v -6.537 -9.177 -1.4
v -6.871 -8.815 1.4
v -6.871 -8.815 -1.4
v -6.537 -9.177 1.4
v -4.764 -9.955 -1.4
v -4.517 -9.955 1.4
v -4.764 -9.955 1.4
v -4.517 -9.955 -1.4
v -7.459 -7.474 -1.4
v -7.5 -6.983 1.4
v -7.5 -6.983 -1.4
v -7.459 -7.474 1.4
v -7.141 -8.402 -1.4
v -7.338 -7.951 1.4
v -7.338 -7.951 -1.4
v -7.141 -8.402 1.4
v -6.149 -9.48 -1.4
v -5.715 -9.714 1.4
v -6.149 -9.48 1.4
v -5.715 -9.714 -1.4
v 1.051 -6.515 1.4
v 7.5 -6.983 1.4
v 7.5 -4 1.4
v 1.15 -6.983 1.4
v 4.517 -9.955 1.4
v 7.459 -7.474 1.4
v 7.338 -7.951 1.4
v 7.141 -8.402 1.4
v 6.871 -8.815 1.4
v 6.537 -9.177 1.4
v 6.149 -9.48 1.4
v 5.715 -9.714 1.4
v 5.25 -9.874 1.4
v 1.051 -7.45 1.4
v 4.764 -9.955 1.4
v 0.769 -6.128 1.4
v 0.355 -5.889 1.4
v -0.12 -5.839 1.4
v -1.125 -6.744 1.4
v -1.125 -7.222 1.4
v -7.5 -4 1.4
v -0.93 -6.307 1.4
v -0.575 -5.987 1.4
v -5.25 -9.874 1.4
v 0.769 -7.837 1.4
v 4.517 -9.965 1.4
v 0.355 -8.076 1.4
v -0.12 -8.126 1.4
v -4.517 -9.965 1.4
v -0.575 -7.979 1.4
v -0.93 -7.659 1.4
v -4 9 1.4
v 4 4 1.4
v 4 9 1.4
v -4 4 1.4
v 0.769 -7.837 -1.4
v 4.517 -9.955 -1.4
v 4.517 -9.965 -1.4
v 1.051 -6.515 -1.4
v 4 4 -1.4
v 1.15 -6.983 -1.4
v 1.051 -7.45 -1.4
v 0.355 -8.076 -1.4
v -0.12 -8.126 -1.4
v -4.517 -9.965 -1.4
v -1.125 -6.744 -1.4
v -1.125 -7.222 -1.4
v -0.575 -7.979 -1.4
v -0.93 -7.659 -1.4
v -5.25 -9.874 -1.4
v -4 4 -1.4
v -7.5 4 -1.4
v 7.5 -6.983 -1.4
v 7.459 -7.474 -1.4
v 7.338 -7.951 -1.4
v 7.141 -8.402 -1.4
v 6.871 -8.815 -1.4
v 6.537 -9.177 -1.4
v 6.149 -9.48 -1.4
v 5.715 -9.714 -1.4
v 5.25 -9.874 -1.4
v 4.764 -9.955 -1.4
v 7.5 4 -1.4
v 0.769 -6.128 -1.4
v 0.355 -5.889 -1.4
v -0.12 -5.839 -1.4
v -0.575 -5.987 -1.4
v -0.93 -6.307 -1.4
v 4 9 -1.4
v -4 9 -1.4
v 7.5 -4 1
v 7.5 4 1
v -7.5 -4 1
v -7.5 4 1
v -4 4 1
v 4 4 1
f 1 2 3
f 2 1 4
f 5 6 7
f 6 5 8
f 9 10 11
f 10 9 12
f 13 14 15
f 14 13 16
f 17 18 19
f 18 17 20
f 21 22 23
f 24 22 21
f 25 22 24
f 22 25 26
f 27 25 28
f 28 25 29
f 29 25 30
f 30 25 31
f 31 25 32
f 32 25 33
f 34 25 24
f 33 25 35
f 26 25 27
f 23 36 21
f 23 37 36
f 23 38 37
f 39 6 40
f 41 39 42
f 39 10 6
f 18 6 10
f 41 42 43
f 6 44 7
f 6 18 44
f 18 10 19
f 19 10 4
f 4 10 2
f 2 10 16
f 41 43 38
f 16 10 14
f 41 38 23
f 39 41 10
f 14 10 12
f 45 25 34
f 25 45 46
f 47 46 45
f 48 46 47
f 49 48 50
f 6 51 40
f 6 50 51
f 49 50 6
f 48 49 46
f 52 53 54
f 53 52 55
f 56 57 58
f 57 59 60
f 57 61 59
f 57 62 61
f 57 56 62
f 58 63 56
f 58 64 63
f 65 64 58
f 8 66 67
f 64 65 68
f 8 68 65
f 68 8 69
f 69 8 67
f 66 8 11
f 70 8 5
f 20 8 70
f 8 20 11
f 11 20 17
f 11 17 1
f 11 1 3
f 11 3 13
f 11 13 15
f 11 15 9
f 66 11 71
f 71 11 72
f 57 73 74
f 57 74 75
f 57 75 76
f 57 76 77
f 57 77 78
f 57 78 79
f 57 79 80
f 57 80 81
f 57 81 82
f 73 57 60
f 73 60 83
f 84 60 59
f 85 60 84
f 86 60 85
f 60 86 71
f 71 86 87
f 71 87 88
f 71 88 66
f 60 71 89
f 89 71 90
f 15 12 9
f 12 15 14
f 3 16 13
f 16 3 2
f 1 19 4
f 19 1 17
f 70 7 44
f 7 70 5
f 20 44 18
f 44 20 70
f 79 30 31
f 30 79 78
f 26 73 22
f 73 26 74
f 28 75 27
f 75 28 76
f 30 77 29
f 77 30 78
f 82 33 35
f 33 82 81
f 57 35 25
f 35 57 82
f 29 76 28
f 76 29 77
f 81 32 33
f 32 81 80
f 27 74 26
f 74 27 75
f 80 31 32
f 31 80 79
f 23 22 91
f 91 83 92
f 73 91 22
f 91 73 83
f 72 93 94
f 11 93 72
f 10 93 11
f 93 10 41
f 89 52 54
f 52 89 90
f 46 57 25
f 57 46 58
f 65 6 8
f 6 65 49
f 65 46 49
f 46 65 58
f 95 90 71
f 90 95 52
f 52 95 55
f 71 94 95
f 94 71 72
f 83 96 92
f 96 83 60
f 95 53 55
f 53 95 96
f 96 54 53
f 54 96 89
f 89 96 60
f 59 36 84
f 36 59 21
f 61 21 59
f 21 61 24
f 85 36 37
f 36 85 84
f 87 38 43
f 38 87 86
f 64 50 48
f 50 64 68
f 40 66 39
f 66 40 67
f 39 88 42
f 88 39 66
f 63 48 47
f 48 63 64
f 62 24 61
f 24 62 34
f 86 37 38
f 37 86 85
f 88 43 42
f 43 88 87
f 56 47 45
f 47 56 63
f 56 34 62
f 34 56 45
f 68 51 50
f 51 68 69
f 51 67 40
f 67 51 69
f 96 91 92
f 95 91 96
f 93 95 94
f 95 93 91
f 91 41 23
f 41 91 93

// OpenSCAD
// file: metric.scad
// nuts
// nutMxW - width of nut, nutMxH - height of nut
// M2
nutM2W = 4.0+0.3;
nutM2H = 1.9+0.2;
nutM2D = nutM2W/cos(30);
// M3
nutM3W = 5.4+0.3;
nutM3H = 2.3+0.2;
nutM3D = nutM3W/cos(30);

// screws
// M2
screwM2D = 2+0.3;
screwM2HeadD = 4.2;
screwM2HeadH = 2.0;
// M3
screwM3D = 3+0.3;
screwM3HeadD = 5.4+0.2;
screwM3HeadH = 3.0;

// lm8uu
lm8uuD = 15+0.4; // Diameter of lm8uu
lm8uuL = 24.1; // Length of lm8uu

// E3Dv5

//fan
fanT = 10; //fanThickness

screwM2 = [screwM2HeadD,screwM2HeadH,screwM2D];
module screw(size,L) {
  cylinder(d=size[0],h=size[1]);
    translate([0,0,size[1]])
      cylinder(d=size[3],h=L);
}

//screw(screwM2,3);
// file: config.scad
include <metric.scad>;


$fa=0.5;
$fs=0.5;

radiatorL=31.8; // Length of radiator
radiatorD=25; // Diameter of radiator
hotendNeckD=12.1;
fanHoleD = 28; //Diameter of fan hole

rodDst = 50; // Distance berween rods



//hotendFanHolderGap=0.1; // Distance between body & holder
centralGap=2; // Distance between two parts of body
wallThickness = 1.5;


// Spetial settings
carriageL=2*lm8uuL+wallThickness*2+centralGap;
hotendFanHolderH=radiatorD/2+5; // z size of hotend's fun holder WITHOUT gap
//hotendFanHolderH=carriageL/2-10; // z size of hotend's fun holder WITHOUT gap
hotendXtranslate=carriageL/2-hotendFanHolderH-10; // Radiator -> Fan distance = 5mm


nutM2 = [nutM2W,nutM2H,nutM2D];
nutM3 = [nutM3W,nutM3H,nutM3D];
fanScewL = 16;
fanHolderLugX=(radiatorL-nutM2D)/2;
fanHolderLugY=(50-lm8uuD)/2-nutM2W/2-wallThickness+0.5;
fanHolderLugDst=sqrt(pow(fanHolderLugX,2)+pow(fanHolderLugY,2)); // Distance from center of lug hole to center of fan hole
fanHolderLugAngle=atan(fanHolderLugY/fanHolderLugX); // I don't know how to describe this))

hh = 0;
//holderNutTranslate = sqrt(pow(lm8uuD/2+wallThickness,2)-pow((lm8uuD/2+wallThickness+hh)-nutM2W/2,2));
holderNutTranslate = sqrt(pow(lm8uuD/2,2)-pow((lm8uuD/2+hh)-nutM2W/2,2));
holderScrewTranslate = sqrt(pow(lm8uuD/2+wallThickness,2)-pow((lm8uuD/2+wallThickness+hh)-screwM2HeadD/2,2));
//holderScrewTranslate = sqrt(pow(lm8uuD/2,2)-pow((lm8uuD/2+hh)-screwM2HeadD/2,2));

gt2PlateL=15;
gt2PlateTh=2*wallThickness;
// main file
include <config.scad>;

module fanHolderLugs(h=8) {
  d=screwM2HeadD+2;
  fanHolderLugDstDiff=(fanHolderLugDst+wallThickness/2)/cos(fanHolderLugAngle)+1;
  for(m=[0,1])
    mirror([m,0,0])
      for(a=[-1,1])
        rotate([0,0,a*fanHolderLugAngle])
          union() {
            translate([fanHolderLugDst,0,0])
              cylinder(d=d,h=h);
            translate([0,-wallThickness/2,0])
              cube([fanHolderLugDst,wallThickness,h]);
          }
  difference() {
    cylinder(d=2*fanHolderLugDst+wallThickness,h=h);
    for(m=[0,1])
      mirror([m,0,0])
        hull()
          for(a=[-1,1])
            rotate([0,0,a*fanHolderLugAngle])
              translate([0,-0.5/2,-1/2])
                cube([fanHolderLugDstDiff,0.5,h+1]);
    translate([0,0,-0.5])
      cylinder(d=2*fanHolderLugDst-wallThickness,h=h+1);  
  }
}

module nutInsideHole(nutParams=nutM2,depth=10) {
  union() {
    rotate([0,0,90])
      cylinder(d=nutParams[2],h=nutParams[1], $fn=6);
    translate([-nutParams[0]/2,0,0])
      cube([nutParams[0],(depth-nutParams[2]/2),nutParams[1]]);
  }
}

module holderMountScrewHoles(l=16) {
  for(x=[-1,1]) 
    for(y=[-1,1]) 
      translate([x*fanHolderLugX,y*fanHolderLugY,0]) {
        difference() {
          translate([0,0,-1])
            cylinder(d=screwM2D,h=l-0.2+1);
          translate([0,0,nutM2H])
            cylinder(d=screwM2D+0.1,h=0.2);
        }
        translate([0,0,l])
          cylinder(d=screwM2HeadD,h=carriageL-hotendFanHolderH-l+1);
        rotate([0,0,-x*90])
          nutInsideHole(nutParams=nutM2,depth=8);
      }
}

module bodyBevel(L=radiatorL/2+wallThickness, // Total length
                     d1=radiatorD+2*wallThickness,
                     d2=fanHoleD+2*wallThickness,
                     h1=radiatorL/2+wallThickness-(fanHoleD+2*wallThickness)/2,
                     h2=carriageL/2+hotendXtranslate-(radiatorD+2*wallThickness)/2,
                     d1Lip=5,
                     d2Lip=0.5) {
   translate([-(d1/2-d1Lip),0,L-h1-d2Lip])
   hull() {
      difference() {
        translate([d1/2-d1Lip,0,-L+h1+d2Lip])
          //cylinder(d=d1,h=h1+d2Lip);
          cylinder(d=d1,h=L);
        translate([0,-(d2+2)/2,-L+h1+d2Lip-1])
          cube([d1+1,d2+2,L+2]);
      }
      union() {
        difference() {
          translate([0,0,-d2/2+d2Lip])
            rotate([0,-90,0])
              cylinder(d=d2, h=h2+d1Lip);
          translate([-(h2+d1Lip+1)+0.5,-(d2+2)/2-1,-(d2-d2Lip+1)])
            cube([h2+d1Lip+1,d2+2,d2-d2Lip+1]);
        }
        translate([-(h2+d1Lip),-sqrt(pow(d2/2,2)-pow(d2/2-d2Lip,2)),-(L-h1-d2Lip)])
        cube([h2+d1Lip,2*sqrt(pow(d2/2,2)-pow(d2/2-d2Lip,2)),L-h1-d2Lip]);
      }
   }
}

module gt2NutGap(d1=nutM2D+2*0.5,d2=nutM2D+2*0.5,gapL=15) {
  translateX=(gapL-d1)/2;
  hull() {
    union() {
      translate([0,0,0.1/2])
        cube([2*translateX,d1,0.1],center=true);
      for(x=[-1,1])
        translate([x*translateX,0,0])
          cylinder(d=d1,h=0.1);
    }
    translate([0,0,-nutM2H/2])
      cylinder(d=d2,h=0.1);
  }
}

module lm8uuHolderScrewLug(r=3,h=10,a=25, th=7) {
  gap=th-2*r;
  xxx=gap+r*(1+sin(a));
  xx=r*cos(a);
  x=xx+xxx*tan(a);
//  translate([0,h/2,0])
    rotate([90,0,0])
      hull() {
        cylinder(r=r,h=h,center=true);
        translate([0,r+gap,0])
          cube([2*x,0.001,h],center=true);
      }
}

module firstLM8UUholder(l=(carriageL-fanT)/2-centralGap/2) {
  screwLugH=holderNutTranslate+nutM2H/2+holderScrewTranslate;
  difference() {
    union() {
      rotate([0,90,0])
        cylinder(d=lm8uuD+2*wallThickness,h=l);
      translate([(carriageL-fanT)/4,screwLugH/2-holderScrewTranslate, -(lm8uuD)/2-wallThickness])
        lm8uuHolderScrewLug(r=(nutM2D+1)/2, h=screwLugH, a=40);
    }
 // translate([(carriageL-fanT)/4,(holderNutTranslate+nutM2H/2+holderScrewTranslate)/2-holderScrewTranslate,-(lm8uuD)/2-wallThickness])
    translate([(carriageL-fanT)/4,(screwLugH)/2-holderScrewTranslate,-(lm8uuD)/2-wallThickness])
      rotate([90,0,0]) 
        #cylinder(d=screwM2D,h=screwLugH+1,center=true);
    translate([(carriageL-fanT)/4,holderNutTranslate,-(lm8uuD)/2-wallThickness])
      rotate([-90,30,0])
        #cylinder(d=nutM2D,h=nutM2H,$fn=6);
    translate([(carriageL-fanT)/4,-holderScrewTranslate+screwM2HeadH/2,-(lm8uuD)/2-wallThickness])
      rotate([90,30,0])
        #cylinder(d=screwM2HeadD,h=screwM2HeadH);
    translate([l/2,0,-(lm8uuD)/2-wallThickness-0.5])
      #cube([l+1,1,(nutM2D+wallThickness)+2],center=true);
  }
}
//gt2Plate();
gt2Cup();

module gt2Cup() {
  difference() {
    union() {
      translate([0,-((nutM2D+2*0.5)/2-5)/2,0])
        cube([gt2PlateL,(nutM2D+2*0.5)/2+8+5,gt2PlateTh-0.2],center=true);
      translate([0,-(8/2+3*(nutM2D+2*0.5)/4),0])
        cube([gt2PlateL-(nutM2D+2*0.5),(nutM2D+2*0.5)/2,gt2PlateTh-0.2],center=true);
      for(t=[-1,1])
        translate([t*(gt2PlateL-(nutM2D+2*0.5))/2,-(8/2+(nutM2D+2*0.5)/2),0])
          cylinder(d=(nutM2D+2*0.5),h=gt2PlateTh-0.2,center=true);
    }
    for (x=[-1,1])
      translate([x*(gt2PlateL/2-wallThickness),8/2+5/2,0])
        #cube([2*wallThickness+1,5,(3/2)*gt2PlateTh-0.2],center=true);
    translate([0,-(8/2+(nutM2D+2*0.5)/2),-(gt2PlateTh/2+nutM2H)])
      cylinder(h=10,d=screwM2D);
    translate([0,0,gt2PlateTh/2])
      #cube([gt2PlateL+1,8,0.5+0.5],center=true);
  }
}

module gt2Plate(xTranslate=-(carriageL-fanT)/2+gt2PlateL/2) {
  
  gt2PlateZ=(lm8uuD+2*wallThickness)/2-gt2PlateTh/2+14;
  translate([xTranslate,-(rodDst/2+14),gt2PlateZ])
  difference() {
    union() {
      translate([0,-((nutM2D+2*0.5)/2-5)/2,0])
        cube([gt2PlateL,(nutM2D+2*0.5)/2+8+5,gt2PlateTh],center=true);
      translate([0,-(8/2+3*(nutM2D+2*0.5)/4),0])
        cube([gt2PlateL-(nutM2D+2*0.5),(nutM2D+2*0.5)/2,gt2PlateTh],center=true);
      for(t=[-1,1])
        translate([t*(gt2PlateL-(nutM2D+2*0.5))/2,-(8/2+(nutM2D+2*0.5)/2),0])
          cylinder(d=(nutM2D+2*0.5),h=gt2PlateTh,center=true);
      translate([0,-(8/2+(nutM2D+2*0.5)/2),-gt2PlateTh/2])
        gt2NutGap();
      translate([0,8/2+5/2,gt2PlateTh/2+((3/2)*gt2PlateTh)/2])
        cube([gt2PlateL,5,(3/2)*gt2PlateTh],center=true);
    }
    translate([0,0,gt2PlateTh/2])
      #cube([gt2PlateL+1,8,0.5+0.5],center=true);
    translate([0,8/2+5/2,gt2PlateTh/2+(gt2PlateTh)/2])
       cube([gt2PlateL-4*wallThickness,5+1,gt2PlateTh],center=true);
    translate([-(gt2PlateL-4*wallThickness)/2,8/2,(gt2PlateTh/2+(gt2PlateTh)/2)/2])
        rotate([-10,0,0])
          #cube([gt2PlateL-4*wallThickness,5+1,gt2PlateTh/2]);
    translate([0,-(8/2+(nutM2D+2*0.5)/2),-(gt2PlateTh/2+nutM2H)]) {
      cylinder(h=10,d=screwM2D);
      cylinder(h=nutM2H,d=nutM2D, $fn=6);
    }
  }
}
